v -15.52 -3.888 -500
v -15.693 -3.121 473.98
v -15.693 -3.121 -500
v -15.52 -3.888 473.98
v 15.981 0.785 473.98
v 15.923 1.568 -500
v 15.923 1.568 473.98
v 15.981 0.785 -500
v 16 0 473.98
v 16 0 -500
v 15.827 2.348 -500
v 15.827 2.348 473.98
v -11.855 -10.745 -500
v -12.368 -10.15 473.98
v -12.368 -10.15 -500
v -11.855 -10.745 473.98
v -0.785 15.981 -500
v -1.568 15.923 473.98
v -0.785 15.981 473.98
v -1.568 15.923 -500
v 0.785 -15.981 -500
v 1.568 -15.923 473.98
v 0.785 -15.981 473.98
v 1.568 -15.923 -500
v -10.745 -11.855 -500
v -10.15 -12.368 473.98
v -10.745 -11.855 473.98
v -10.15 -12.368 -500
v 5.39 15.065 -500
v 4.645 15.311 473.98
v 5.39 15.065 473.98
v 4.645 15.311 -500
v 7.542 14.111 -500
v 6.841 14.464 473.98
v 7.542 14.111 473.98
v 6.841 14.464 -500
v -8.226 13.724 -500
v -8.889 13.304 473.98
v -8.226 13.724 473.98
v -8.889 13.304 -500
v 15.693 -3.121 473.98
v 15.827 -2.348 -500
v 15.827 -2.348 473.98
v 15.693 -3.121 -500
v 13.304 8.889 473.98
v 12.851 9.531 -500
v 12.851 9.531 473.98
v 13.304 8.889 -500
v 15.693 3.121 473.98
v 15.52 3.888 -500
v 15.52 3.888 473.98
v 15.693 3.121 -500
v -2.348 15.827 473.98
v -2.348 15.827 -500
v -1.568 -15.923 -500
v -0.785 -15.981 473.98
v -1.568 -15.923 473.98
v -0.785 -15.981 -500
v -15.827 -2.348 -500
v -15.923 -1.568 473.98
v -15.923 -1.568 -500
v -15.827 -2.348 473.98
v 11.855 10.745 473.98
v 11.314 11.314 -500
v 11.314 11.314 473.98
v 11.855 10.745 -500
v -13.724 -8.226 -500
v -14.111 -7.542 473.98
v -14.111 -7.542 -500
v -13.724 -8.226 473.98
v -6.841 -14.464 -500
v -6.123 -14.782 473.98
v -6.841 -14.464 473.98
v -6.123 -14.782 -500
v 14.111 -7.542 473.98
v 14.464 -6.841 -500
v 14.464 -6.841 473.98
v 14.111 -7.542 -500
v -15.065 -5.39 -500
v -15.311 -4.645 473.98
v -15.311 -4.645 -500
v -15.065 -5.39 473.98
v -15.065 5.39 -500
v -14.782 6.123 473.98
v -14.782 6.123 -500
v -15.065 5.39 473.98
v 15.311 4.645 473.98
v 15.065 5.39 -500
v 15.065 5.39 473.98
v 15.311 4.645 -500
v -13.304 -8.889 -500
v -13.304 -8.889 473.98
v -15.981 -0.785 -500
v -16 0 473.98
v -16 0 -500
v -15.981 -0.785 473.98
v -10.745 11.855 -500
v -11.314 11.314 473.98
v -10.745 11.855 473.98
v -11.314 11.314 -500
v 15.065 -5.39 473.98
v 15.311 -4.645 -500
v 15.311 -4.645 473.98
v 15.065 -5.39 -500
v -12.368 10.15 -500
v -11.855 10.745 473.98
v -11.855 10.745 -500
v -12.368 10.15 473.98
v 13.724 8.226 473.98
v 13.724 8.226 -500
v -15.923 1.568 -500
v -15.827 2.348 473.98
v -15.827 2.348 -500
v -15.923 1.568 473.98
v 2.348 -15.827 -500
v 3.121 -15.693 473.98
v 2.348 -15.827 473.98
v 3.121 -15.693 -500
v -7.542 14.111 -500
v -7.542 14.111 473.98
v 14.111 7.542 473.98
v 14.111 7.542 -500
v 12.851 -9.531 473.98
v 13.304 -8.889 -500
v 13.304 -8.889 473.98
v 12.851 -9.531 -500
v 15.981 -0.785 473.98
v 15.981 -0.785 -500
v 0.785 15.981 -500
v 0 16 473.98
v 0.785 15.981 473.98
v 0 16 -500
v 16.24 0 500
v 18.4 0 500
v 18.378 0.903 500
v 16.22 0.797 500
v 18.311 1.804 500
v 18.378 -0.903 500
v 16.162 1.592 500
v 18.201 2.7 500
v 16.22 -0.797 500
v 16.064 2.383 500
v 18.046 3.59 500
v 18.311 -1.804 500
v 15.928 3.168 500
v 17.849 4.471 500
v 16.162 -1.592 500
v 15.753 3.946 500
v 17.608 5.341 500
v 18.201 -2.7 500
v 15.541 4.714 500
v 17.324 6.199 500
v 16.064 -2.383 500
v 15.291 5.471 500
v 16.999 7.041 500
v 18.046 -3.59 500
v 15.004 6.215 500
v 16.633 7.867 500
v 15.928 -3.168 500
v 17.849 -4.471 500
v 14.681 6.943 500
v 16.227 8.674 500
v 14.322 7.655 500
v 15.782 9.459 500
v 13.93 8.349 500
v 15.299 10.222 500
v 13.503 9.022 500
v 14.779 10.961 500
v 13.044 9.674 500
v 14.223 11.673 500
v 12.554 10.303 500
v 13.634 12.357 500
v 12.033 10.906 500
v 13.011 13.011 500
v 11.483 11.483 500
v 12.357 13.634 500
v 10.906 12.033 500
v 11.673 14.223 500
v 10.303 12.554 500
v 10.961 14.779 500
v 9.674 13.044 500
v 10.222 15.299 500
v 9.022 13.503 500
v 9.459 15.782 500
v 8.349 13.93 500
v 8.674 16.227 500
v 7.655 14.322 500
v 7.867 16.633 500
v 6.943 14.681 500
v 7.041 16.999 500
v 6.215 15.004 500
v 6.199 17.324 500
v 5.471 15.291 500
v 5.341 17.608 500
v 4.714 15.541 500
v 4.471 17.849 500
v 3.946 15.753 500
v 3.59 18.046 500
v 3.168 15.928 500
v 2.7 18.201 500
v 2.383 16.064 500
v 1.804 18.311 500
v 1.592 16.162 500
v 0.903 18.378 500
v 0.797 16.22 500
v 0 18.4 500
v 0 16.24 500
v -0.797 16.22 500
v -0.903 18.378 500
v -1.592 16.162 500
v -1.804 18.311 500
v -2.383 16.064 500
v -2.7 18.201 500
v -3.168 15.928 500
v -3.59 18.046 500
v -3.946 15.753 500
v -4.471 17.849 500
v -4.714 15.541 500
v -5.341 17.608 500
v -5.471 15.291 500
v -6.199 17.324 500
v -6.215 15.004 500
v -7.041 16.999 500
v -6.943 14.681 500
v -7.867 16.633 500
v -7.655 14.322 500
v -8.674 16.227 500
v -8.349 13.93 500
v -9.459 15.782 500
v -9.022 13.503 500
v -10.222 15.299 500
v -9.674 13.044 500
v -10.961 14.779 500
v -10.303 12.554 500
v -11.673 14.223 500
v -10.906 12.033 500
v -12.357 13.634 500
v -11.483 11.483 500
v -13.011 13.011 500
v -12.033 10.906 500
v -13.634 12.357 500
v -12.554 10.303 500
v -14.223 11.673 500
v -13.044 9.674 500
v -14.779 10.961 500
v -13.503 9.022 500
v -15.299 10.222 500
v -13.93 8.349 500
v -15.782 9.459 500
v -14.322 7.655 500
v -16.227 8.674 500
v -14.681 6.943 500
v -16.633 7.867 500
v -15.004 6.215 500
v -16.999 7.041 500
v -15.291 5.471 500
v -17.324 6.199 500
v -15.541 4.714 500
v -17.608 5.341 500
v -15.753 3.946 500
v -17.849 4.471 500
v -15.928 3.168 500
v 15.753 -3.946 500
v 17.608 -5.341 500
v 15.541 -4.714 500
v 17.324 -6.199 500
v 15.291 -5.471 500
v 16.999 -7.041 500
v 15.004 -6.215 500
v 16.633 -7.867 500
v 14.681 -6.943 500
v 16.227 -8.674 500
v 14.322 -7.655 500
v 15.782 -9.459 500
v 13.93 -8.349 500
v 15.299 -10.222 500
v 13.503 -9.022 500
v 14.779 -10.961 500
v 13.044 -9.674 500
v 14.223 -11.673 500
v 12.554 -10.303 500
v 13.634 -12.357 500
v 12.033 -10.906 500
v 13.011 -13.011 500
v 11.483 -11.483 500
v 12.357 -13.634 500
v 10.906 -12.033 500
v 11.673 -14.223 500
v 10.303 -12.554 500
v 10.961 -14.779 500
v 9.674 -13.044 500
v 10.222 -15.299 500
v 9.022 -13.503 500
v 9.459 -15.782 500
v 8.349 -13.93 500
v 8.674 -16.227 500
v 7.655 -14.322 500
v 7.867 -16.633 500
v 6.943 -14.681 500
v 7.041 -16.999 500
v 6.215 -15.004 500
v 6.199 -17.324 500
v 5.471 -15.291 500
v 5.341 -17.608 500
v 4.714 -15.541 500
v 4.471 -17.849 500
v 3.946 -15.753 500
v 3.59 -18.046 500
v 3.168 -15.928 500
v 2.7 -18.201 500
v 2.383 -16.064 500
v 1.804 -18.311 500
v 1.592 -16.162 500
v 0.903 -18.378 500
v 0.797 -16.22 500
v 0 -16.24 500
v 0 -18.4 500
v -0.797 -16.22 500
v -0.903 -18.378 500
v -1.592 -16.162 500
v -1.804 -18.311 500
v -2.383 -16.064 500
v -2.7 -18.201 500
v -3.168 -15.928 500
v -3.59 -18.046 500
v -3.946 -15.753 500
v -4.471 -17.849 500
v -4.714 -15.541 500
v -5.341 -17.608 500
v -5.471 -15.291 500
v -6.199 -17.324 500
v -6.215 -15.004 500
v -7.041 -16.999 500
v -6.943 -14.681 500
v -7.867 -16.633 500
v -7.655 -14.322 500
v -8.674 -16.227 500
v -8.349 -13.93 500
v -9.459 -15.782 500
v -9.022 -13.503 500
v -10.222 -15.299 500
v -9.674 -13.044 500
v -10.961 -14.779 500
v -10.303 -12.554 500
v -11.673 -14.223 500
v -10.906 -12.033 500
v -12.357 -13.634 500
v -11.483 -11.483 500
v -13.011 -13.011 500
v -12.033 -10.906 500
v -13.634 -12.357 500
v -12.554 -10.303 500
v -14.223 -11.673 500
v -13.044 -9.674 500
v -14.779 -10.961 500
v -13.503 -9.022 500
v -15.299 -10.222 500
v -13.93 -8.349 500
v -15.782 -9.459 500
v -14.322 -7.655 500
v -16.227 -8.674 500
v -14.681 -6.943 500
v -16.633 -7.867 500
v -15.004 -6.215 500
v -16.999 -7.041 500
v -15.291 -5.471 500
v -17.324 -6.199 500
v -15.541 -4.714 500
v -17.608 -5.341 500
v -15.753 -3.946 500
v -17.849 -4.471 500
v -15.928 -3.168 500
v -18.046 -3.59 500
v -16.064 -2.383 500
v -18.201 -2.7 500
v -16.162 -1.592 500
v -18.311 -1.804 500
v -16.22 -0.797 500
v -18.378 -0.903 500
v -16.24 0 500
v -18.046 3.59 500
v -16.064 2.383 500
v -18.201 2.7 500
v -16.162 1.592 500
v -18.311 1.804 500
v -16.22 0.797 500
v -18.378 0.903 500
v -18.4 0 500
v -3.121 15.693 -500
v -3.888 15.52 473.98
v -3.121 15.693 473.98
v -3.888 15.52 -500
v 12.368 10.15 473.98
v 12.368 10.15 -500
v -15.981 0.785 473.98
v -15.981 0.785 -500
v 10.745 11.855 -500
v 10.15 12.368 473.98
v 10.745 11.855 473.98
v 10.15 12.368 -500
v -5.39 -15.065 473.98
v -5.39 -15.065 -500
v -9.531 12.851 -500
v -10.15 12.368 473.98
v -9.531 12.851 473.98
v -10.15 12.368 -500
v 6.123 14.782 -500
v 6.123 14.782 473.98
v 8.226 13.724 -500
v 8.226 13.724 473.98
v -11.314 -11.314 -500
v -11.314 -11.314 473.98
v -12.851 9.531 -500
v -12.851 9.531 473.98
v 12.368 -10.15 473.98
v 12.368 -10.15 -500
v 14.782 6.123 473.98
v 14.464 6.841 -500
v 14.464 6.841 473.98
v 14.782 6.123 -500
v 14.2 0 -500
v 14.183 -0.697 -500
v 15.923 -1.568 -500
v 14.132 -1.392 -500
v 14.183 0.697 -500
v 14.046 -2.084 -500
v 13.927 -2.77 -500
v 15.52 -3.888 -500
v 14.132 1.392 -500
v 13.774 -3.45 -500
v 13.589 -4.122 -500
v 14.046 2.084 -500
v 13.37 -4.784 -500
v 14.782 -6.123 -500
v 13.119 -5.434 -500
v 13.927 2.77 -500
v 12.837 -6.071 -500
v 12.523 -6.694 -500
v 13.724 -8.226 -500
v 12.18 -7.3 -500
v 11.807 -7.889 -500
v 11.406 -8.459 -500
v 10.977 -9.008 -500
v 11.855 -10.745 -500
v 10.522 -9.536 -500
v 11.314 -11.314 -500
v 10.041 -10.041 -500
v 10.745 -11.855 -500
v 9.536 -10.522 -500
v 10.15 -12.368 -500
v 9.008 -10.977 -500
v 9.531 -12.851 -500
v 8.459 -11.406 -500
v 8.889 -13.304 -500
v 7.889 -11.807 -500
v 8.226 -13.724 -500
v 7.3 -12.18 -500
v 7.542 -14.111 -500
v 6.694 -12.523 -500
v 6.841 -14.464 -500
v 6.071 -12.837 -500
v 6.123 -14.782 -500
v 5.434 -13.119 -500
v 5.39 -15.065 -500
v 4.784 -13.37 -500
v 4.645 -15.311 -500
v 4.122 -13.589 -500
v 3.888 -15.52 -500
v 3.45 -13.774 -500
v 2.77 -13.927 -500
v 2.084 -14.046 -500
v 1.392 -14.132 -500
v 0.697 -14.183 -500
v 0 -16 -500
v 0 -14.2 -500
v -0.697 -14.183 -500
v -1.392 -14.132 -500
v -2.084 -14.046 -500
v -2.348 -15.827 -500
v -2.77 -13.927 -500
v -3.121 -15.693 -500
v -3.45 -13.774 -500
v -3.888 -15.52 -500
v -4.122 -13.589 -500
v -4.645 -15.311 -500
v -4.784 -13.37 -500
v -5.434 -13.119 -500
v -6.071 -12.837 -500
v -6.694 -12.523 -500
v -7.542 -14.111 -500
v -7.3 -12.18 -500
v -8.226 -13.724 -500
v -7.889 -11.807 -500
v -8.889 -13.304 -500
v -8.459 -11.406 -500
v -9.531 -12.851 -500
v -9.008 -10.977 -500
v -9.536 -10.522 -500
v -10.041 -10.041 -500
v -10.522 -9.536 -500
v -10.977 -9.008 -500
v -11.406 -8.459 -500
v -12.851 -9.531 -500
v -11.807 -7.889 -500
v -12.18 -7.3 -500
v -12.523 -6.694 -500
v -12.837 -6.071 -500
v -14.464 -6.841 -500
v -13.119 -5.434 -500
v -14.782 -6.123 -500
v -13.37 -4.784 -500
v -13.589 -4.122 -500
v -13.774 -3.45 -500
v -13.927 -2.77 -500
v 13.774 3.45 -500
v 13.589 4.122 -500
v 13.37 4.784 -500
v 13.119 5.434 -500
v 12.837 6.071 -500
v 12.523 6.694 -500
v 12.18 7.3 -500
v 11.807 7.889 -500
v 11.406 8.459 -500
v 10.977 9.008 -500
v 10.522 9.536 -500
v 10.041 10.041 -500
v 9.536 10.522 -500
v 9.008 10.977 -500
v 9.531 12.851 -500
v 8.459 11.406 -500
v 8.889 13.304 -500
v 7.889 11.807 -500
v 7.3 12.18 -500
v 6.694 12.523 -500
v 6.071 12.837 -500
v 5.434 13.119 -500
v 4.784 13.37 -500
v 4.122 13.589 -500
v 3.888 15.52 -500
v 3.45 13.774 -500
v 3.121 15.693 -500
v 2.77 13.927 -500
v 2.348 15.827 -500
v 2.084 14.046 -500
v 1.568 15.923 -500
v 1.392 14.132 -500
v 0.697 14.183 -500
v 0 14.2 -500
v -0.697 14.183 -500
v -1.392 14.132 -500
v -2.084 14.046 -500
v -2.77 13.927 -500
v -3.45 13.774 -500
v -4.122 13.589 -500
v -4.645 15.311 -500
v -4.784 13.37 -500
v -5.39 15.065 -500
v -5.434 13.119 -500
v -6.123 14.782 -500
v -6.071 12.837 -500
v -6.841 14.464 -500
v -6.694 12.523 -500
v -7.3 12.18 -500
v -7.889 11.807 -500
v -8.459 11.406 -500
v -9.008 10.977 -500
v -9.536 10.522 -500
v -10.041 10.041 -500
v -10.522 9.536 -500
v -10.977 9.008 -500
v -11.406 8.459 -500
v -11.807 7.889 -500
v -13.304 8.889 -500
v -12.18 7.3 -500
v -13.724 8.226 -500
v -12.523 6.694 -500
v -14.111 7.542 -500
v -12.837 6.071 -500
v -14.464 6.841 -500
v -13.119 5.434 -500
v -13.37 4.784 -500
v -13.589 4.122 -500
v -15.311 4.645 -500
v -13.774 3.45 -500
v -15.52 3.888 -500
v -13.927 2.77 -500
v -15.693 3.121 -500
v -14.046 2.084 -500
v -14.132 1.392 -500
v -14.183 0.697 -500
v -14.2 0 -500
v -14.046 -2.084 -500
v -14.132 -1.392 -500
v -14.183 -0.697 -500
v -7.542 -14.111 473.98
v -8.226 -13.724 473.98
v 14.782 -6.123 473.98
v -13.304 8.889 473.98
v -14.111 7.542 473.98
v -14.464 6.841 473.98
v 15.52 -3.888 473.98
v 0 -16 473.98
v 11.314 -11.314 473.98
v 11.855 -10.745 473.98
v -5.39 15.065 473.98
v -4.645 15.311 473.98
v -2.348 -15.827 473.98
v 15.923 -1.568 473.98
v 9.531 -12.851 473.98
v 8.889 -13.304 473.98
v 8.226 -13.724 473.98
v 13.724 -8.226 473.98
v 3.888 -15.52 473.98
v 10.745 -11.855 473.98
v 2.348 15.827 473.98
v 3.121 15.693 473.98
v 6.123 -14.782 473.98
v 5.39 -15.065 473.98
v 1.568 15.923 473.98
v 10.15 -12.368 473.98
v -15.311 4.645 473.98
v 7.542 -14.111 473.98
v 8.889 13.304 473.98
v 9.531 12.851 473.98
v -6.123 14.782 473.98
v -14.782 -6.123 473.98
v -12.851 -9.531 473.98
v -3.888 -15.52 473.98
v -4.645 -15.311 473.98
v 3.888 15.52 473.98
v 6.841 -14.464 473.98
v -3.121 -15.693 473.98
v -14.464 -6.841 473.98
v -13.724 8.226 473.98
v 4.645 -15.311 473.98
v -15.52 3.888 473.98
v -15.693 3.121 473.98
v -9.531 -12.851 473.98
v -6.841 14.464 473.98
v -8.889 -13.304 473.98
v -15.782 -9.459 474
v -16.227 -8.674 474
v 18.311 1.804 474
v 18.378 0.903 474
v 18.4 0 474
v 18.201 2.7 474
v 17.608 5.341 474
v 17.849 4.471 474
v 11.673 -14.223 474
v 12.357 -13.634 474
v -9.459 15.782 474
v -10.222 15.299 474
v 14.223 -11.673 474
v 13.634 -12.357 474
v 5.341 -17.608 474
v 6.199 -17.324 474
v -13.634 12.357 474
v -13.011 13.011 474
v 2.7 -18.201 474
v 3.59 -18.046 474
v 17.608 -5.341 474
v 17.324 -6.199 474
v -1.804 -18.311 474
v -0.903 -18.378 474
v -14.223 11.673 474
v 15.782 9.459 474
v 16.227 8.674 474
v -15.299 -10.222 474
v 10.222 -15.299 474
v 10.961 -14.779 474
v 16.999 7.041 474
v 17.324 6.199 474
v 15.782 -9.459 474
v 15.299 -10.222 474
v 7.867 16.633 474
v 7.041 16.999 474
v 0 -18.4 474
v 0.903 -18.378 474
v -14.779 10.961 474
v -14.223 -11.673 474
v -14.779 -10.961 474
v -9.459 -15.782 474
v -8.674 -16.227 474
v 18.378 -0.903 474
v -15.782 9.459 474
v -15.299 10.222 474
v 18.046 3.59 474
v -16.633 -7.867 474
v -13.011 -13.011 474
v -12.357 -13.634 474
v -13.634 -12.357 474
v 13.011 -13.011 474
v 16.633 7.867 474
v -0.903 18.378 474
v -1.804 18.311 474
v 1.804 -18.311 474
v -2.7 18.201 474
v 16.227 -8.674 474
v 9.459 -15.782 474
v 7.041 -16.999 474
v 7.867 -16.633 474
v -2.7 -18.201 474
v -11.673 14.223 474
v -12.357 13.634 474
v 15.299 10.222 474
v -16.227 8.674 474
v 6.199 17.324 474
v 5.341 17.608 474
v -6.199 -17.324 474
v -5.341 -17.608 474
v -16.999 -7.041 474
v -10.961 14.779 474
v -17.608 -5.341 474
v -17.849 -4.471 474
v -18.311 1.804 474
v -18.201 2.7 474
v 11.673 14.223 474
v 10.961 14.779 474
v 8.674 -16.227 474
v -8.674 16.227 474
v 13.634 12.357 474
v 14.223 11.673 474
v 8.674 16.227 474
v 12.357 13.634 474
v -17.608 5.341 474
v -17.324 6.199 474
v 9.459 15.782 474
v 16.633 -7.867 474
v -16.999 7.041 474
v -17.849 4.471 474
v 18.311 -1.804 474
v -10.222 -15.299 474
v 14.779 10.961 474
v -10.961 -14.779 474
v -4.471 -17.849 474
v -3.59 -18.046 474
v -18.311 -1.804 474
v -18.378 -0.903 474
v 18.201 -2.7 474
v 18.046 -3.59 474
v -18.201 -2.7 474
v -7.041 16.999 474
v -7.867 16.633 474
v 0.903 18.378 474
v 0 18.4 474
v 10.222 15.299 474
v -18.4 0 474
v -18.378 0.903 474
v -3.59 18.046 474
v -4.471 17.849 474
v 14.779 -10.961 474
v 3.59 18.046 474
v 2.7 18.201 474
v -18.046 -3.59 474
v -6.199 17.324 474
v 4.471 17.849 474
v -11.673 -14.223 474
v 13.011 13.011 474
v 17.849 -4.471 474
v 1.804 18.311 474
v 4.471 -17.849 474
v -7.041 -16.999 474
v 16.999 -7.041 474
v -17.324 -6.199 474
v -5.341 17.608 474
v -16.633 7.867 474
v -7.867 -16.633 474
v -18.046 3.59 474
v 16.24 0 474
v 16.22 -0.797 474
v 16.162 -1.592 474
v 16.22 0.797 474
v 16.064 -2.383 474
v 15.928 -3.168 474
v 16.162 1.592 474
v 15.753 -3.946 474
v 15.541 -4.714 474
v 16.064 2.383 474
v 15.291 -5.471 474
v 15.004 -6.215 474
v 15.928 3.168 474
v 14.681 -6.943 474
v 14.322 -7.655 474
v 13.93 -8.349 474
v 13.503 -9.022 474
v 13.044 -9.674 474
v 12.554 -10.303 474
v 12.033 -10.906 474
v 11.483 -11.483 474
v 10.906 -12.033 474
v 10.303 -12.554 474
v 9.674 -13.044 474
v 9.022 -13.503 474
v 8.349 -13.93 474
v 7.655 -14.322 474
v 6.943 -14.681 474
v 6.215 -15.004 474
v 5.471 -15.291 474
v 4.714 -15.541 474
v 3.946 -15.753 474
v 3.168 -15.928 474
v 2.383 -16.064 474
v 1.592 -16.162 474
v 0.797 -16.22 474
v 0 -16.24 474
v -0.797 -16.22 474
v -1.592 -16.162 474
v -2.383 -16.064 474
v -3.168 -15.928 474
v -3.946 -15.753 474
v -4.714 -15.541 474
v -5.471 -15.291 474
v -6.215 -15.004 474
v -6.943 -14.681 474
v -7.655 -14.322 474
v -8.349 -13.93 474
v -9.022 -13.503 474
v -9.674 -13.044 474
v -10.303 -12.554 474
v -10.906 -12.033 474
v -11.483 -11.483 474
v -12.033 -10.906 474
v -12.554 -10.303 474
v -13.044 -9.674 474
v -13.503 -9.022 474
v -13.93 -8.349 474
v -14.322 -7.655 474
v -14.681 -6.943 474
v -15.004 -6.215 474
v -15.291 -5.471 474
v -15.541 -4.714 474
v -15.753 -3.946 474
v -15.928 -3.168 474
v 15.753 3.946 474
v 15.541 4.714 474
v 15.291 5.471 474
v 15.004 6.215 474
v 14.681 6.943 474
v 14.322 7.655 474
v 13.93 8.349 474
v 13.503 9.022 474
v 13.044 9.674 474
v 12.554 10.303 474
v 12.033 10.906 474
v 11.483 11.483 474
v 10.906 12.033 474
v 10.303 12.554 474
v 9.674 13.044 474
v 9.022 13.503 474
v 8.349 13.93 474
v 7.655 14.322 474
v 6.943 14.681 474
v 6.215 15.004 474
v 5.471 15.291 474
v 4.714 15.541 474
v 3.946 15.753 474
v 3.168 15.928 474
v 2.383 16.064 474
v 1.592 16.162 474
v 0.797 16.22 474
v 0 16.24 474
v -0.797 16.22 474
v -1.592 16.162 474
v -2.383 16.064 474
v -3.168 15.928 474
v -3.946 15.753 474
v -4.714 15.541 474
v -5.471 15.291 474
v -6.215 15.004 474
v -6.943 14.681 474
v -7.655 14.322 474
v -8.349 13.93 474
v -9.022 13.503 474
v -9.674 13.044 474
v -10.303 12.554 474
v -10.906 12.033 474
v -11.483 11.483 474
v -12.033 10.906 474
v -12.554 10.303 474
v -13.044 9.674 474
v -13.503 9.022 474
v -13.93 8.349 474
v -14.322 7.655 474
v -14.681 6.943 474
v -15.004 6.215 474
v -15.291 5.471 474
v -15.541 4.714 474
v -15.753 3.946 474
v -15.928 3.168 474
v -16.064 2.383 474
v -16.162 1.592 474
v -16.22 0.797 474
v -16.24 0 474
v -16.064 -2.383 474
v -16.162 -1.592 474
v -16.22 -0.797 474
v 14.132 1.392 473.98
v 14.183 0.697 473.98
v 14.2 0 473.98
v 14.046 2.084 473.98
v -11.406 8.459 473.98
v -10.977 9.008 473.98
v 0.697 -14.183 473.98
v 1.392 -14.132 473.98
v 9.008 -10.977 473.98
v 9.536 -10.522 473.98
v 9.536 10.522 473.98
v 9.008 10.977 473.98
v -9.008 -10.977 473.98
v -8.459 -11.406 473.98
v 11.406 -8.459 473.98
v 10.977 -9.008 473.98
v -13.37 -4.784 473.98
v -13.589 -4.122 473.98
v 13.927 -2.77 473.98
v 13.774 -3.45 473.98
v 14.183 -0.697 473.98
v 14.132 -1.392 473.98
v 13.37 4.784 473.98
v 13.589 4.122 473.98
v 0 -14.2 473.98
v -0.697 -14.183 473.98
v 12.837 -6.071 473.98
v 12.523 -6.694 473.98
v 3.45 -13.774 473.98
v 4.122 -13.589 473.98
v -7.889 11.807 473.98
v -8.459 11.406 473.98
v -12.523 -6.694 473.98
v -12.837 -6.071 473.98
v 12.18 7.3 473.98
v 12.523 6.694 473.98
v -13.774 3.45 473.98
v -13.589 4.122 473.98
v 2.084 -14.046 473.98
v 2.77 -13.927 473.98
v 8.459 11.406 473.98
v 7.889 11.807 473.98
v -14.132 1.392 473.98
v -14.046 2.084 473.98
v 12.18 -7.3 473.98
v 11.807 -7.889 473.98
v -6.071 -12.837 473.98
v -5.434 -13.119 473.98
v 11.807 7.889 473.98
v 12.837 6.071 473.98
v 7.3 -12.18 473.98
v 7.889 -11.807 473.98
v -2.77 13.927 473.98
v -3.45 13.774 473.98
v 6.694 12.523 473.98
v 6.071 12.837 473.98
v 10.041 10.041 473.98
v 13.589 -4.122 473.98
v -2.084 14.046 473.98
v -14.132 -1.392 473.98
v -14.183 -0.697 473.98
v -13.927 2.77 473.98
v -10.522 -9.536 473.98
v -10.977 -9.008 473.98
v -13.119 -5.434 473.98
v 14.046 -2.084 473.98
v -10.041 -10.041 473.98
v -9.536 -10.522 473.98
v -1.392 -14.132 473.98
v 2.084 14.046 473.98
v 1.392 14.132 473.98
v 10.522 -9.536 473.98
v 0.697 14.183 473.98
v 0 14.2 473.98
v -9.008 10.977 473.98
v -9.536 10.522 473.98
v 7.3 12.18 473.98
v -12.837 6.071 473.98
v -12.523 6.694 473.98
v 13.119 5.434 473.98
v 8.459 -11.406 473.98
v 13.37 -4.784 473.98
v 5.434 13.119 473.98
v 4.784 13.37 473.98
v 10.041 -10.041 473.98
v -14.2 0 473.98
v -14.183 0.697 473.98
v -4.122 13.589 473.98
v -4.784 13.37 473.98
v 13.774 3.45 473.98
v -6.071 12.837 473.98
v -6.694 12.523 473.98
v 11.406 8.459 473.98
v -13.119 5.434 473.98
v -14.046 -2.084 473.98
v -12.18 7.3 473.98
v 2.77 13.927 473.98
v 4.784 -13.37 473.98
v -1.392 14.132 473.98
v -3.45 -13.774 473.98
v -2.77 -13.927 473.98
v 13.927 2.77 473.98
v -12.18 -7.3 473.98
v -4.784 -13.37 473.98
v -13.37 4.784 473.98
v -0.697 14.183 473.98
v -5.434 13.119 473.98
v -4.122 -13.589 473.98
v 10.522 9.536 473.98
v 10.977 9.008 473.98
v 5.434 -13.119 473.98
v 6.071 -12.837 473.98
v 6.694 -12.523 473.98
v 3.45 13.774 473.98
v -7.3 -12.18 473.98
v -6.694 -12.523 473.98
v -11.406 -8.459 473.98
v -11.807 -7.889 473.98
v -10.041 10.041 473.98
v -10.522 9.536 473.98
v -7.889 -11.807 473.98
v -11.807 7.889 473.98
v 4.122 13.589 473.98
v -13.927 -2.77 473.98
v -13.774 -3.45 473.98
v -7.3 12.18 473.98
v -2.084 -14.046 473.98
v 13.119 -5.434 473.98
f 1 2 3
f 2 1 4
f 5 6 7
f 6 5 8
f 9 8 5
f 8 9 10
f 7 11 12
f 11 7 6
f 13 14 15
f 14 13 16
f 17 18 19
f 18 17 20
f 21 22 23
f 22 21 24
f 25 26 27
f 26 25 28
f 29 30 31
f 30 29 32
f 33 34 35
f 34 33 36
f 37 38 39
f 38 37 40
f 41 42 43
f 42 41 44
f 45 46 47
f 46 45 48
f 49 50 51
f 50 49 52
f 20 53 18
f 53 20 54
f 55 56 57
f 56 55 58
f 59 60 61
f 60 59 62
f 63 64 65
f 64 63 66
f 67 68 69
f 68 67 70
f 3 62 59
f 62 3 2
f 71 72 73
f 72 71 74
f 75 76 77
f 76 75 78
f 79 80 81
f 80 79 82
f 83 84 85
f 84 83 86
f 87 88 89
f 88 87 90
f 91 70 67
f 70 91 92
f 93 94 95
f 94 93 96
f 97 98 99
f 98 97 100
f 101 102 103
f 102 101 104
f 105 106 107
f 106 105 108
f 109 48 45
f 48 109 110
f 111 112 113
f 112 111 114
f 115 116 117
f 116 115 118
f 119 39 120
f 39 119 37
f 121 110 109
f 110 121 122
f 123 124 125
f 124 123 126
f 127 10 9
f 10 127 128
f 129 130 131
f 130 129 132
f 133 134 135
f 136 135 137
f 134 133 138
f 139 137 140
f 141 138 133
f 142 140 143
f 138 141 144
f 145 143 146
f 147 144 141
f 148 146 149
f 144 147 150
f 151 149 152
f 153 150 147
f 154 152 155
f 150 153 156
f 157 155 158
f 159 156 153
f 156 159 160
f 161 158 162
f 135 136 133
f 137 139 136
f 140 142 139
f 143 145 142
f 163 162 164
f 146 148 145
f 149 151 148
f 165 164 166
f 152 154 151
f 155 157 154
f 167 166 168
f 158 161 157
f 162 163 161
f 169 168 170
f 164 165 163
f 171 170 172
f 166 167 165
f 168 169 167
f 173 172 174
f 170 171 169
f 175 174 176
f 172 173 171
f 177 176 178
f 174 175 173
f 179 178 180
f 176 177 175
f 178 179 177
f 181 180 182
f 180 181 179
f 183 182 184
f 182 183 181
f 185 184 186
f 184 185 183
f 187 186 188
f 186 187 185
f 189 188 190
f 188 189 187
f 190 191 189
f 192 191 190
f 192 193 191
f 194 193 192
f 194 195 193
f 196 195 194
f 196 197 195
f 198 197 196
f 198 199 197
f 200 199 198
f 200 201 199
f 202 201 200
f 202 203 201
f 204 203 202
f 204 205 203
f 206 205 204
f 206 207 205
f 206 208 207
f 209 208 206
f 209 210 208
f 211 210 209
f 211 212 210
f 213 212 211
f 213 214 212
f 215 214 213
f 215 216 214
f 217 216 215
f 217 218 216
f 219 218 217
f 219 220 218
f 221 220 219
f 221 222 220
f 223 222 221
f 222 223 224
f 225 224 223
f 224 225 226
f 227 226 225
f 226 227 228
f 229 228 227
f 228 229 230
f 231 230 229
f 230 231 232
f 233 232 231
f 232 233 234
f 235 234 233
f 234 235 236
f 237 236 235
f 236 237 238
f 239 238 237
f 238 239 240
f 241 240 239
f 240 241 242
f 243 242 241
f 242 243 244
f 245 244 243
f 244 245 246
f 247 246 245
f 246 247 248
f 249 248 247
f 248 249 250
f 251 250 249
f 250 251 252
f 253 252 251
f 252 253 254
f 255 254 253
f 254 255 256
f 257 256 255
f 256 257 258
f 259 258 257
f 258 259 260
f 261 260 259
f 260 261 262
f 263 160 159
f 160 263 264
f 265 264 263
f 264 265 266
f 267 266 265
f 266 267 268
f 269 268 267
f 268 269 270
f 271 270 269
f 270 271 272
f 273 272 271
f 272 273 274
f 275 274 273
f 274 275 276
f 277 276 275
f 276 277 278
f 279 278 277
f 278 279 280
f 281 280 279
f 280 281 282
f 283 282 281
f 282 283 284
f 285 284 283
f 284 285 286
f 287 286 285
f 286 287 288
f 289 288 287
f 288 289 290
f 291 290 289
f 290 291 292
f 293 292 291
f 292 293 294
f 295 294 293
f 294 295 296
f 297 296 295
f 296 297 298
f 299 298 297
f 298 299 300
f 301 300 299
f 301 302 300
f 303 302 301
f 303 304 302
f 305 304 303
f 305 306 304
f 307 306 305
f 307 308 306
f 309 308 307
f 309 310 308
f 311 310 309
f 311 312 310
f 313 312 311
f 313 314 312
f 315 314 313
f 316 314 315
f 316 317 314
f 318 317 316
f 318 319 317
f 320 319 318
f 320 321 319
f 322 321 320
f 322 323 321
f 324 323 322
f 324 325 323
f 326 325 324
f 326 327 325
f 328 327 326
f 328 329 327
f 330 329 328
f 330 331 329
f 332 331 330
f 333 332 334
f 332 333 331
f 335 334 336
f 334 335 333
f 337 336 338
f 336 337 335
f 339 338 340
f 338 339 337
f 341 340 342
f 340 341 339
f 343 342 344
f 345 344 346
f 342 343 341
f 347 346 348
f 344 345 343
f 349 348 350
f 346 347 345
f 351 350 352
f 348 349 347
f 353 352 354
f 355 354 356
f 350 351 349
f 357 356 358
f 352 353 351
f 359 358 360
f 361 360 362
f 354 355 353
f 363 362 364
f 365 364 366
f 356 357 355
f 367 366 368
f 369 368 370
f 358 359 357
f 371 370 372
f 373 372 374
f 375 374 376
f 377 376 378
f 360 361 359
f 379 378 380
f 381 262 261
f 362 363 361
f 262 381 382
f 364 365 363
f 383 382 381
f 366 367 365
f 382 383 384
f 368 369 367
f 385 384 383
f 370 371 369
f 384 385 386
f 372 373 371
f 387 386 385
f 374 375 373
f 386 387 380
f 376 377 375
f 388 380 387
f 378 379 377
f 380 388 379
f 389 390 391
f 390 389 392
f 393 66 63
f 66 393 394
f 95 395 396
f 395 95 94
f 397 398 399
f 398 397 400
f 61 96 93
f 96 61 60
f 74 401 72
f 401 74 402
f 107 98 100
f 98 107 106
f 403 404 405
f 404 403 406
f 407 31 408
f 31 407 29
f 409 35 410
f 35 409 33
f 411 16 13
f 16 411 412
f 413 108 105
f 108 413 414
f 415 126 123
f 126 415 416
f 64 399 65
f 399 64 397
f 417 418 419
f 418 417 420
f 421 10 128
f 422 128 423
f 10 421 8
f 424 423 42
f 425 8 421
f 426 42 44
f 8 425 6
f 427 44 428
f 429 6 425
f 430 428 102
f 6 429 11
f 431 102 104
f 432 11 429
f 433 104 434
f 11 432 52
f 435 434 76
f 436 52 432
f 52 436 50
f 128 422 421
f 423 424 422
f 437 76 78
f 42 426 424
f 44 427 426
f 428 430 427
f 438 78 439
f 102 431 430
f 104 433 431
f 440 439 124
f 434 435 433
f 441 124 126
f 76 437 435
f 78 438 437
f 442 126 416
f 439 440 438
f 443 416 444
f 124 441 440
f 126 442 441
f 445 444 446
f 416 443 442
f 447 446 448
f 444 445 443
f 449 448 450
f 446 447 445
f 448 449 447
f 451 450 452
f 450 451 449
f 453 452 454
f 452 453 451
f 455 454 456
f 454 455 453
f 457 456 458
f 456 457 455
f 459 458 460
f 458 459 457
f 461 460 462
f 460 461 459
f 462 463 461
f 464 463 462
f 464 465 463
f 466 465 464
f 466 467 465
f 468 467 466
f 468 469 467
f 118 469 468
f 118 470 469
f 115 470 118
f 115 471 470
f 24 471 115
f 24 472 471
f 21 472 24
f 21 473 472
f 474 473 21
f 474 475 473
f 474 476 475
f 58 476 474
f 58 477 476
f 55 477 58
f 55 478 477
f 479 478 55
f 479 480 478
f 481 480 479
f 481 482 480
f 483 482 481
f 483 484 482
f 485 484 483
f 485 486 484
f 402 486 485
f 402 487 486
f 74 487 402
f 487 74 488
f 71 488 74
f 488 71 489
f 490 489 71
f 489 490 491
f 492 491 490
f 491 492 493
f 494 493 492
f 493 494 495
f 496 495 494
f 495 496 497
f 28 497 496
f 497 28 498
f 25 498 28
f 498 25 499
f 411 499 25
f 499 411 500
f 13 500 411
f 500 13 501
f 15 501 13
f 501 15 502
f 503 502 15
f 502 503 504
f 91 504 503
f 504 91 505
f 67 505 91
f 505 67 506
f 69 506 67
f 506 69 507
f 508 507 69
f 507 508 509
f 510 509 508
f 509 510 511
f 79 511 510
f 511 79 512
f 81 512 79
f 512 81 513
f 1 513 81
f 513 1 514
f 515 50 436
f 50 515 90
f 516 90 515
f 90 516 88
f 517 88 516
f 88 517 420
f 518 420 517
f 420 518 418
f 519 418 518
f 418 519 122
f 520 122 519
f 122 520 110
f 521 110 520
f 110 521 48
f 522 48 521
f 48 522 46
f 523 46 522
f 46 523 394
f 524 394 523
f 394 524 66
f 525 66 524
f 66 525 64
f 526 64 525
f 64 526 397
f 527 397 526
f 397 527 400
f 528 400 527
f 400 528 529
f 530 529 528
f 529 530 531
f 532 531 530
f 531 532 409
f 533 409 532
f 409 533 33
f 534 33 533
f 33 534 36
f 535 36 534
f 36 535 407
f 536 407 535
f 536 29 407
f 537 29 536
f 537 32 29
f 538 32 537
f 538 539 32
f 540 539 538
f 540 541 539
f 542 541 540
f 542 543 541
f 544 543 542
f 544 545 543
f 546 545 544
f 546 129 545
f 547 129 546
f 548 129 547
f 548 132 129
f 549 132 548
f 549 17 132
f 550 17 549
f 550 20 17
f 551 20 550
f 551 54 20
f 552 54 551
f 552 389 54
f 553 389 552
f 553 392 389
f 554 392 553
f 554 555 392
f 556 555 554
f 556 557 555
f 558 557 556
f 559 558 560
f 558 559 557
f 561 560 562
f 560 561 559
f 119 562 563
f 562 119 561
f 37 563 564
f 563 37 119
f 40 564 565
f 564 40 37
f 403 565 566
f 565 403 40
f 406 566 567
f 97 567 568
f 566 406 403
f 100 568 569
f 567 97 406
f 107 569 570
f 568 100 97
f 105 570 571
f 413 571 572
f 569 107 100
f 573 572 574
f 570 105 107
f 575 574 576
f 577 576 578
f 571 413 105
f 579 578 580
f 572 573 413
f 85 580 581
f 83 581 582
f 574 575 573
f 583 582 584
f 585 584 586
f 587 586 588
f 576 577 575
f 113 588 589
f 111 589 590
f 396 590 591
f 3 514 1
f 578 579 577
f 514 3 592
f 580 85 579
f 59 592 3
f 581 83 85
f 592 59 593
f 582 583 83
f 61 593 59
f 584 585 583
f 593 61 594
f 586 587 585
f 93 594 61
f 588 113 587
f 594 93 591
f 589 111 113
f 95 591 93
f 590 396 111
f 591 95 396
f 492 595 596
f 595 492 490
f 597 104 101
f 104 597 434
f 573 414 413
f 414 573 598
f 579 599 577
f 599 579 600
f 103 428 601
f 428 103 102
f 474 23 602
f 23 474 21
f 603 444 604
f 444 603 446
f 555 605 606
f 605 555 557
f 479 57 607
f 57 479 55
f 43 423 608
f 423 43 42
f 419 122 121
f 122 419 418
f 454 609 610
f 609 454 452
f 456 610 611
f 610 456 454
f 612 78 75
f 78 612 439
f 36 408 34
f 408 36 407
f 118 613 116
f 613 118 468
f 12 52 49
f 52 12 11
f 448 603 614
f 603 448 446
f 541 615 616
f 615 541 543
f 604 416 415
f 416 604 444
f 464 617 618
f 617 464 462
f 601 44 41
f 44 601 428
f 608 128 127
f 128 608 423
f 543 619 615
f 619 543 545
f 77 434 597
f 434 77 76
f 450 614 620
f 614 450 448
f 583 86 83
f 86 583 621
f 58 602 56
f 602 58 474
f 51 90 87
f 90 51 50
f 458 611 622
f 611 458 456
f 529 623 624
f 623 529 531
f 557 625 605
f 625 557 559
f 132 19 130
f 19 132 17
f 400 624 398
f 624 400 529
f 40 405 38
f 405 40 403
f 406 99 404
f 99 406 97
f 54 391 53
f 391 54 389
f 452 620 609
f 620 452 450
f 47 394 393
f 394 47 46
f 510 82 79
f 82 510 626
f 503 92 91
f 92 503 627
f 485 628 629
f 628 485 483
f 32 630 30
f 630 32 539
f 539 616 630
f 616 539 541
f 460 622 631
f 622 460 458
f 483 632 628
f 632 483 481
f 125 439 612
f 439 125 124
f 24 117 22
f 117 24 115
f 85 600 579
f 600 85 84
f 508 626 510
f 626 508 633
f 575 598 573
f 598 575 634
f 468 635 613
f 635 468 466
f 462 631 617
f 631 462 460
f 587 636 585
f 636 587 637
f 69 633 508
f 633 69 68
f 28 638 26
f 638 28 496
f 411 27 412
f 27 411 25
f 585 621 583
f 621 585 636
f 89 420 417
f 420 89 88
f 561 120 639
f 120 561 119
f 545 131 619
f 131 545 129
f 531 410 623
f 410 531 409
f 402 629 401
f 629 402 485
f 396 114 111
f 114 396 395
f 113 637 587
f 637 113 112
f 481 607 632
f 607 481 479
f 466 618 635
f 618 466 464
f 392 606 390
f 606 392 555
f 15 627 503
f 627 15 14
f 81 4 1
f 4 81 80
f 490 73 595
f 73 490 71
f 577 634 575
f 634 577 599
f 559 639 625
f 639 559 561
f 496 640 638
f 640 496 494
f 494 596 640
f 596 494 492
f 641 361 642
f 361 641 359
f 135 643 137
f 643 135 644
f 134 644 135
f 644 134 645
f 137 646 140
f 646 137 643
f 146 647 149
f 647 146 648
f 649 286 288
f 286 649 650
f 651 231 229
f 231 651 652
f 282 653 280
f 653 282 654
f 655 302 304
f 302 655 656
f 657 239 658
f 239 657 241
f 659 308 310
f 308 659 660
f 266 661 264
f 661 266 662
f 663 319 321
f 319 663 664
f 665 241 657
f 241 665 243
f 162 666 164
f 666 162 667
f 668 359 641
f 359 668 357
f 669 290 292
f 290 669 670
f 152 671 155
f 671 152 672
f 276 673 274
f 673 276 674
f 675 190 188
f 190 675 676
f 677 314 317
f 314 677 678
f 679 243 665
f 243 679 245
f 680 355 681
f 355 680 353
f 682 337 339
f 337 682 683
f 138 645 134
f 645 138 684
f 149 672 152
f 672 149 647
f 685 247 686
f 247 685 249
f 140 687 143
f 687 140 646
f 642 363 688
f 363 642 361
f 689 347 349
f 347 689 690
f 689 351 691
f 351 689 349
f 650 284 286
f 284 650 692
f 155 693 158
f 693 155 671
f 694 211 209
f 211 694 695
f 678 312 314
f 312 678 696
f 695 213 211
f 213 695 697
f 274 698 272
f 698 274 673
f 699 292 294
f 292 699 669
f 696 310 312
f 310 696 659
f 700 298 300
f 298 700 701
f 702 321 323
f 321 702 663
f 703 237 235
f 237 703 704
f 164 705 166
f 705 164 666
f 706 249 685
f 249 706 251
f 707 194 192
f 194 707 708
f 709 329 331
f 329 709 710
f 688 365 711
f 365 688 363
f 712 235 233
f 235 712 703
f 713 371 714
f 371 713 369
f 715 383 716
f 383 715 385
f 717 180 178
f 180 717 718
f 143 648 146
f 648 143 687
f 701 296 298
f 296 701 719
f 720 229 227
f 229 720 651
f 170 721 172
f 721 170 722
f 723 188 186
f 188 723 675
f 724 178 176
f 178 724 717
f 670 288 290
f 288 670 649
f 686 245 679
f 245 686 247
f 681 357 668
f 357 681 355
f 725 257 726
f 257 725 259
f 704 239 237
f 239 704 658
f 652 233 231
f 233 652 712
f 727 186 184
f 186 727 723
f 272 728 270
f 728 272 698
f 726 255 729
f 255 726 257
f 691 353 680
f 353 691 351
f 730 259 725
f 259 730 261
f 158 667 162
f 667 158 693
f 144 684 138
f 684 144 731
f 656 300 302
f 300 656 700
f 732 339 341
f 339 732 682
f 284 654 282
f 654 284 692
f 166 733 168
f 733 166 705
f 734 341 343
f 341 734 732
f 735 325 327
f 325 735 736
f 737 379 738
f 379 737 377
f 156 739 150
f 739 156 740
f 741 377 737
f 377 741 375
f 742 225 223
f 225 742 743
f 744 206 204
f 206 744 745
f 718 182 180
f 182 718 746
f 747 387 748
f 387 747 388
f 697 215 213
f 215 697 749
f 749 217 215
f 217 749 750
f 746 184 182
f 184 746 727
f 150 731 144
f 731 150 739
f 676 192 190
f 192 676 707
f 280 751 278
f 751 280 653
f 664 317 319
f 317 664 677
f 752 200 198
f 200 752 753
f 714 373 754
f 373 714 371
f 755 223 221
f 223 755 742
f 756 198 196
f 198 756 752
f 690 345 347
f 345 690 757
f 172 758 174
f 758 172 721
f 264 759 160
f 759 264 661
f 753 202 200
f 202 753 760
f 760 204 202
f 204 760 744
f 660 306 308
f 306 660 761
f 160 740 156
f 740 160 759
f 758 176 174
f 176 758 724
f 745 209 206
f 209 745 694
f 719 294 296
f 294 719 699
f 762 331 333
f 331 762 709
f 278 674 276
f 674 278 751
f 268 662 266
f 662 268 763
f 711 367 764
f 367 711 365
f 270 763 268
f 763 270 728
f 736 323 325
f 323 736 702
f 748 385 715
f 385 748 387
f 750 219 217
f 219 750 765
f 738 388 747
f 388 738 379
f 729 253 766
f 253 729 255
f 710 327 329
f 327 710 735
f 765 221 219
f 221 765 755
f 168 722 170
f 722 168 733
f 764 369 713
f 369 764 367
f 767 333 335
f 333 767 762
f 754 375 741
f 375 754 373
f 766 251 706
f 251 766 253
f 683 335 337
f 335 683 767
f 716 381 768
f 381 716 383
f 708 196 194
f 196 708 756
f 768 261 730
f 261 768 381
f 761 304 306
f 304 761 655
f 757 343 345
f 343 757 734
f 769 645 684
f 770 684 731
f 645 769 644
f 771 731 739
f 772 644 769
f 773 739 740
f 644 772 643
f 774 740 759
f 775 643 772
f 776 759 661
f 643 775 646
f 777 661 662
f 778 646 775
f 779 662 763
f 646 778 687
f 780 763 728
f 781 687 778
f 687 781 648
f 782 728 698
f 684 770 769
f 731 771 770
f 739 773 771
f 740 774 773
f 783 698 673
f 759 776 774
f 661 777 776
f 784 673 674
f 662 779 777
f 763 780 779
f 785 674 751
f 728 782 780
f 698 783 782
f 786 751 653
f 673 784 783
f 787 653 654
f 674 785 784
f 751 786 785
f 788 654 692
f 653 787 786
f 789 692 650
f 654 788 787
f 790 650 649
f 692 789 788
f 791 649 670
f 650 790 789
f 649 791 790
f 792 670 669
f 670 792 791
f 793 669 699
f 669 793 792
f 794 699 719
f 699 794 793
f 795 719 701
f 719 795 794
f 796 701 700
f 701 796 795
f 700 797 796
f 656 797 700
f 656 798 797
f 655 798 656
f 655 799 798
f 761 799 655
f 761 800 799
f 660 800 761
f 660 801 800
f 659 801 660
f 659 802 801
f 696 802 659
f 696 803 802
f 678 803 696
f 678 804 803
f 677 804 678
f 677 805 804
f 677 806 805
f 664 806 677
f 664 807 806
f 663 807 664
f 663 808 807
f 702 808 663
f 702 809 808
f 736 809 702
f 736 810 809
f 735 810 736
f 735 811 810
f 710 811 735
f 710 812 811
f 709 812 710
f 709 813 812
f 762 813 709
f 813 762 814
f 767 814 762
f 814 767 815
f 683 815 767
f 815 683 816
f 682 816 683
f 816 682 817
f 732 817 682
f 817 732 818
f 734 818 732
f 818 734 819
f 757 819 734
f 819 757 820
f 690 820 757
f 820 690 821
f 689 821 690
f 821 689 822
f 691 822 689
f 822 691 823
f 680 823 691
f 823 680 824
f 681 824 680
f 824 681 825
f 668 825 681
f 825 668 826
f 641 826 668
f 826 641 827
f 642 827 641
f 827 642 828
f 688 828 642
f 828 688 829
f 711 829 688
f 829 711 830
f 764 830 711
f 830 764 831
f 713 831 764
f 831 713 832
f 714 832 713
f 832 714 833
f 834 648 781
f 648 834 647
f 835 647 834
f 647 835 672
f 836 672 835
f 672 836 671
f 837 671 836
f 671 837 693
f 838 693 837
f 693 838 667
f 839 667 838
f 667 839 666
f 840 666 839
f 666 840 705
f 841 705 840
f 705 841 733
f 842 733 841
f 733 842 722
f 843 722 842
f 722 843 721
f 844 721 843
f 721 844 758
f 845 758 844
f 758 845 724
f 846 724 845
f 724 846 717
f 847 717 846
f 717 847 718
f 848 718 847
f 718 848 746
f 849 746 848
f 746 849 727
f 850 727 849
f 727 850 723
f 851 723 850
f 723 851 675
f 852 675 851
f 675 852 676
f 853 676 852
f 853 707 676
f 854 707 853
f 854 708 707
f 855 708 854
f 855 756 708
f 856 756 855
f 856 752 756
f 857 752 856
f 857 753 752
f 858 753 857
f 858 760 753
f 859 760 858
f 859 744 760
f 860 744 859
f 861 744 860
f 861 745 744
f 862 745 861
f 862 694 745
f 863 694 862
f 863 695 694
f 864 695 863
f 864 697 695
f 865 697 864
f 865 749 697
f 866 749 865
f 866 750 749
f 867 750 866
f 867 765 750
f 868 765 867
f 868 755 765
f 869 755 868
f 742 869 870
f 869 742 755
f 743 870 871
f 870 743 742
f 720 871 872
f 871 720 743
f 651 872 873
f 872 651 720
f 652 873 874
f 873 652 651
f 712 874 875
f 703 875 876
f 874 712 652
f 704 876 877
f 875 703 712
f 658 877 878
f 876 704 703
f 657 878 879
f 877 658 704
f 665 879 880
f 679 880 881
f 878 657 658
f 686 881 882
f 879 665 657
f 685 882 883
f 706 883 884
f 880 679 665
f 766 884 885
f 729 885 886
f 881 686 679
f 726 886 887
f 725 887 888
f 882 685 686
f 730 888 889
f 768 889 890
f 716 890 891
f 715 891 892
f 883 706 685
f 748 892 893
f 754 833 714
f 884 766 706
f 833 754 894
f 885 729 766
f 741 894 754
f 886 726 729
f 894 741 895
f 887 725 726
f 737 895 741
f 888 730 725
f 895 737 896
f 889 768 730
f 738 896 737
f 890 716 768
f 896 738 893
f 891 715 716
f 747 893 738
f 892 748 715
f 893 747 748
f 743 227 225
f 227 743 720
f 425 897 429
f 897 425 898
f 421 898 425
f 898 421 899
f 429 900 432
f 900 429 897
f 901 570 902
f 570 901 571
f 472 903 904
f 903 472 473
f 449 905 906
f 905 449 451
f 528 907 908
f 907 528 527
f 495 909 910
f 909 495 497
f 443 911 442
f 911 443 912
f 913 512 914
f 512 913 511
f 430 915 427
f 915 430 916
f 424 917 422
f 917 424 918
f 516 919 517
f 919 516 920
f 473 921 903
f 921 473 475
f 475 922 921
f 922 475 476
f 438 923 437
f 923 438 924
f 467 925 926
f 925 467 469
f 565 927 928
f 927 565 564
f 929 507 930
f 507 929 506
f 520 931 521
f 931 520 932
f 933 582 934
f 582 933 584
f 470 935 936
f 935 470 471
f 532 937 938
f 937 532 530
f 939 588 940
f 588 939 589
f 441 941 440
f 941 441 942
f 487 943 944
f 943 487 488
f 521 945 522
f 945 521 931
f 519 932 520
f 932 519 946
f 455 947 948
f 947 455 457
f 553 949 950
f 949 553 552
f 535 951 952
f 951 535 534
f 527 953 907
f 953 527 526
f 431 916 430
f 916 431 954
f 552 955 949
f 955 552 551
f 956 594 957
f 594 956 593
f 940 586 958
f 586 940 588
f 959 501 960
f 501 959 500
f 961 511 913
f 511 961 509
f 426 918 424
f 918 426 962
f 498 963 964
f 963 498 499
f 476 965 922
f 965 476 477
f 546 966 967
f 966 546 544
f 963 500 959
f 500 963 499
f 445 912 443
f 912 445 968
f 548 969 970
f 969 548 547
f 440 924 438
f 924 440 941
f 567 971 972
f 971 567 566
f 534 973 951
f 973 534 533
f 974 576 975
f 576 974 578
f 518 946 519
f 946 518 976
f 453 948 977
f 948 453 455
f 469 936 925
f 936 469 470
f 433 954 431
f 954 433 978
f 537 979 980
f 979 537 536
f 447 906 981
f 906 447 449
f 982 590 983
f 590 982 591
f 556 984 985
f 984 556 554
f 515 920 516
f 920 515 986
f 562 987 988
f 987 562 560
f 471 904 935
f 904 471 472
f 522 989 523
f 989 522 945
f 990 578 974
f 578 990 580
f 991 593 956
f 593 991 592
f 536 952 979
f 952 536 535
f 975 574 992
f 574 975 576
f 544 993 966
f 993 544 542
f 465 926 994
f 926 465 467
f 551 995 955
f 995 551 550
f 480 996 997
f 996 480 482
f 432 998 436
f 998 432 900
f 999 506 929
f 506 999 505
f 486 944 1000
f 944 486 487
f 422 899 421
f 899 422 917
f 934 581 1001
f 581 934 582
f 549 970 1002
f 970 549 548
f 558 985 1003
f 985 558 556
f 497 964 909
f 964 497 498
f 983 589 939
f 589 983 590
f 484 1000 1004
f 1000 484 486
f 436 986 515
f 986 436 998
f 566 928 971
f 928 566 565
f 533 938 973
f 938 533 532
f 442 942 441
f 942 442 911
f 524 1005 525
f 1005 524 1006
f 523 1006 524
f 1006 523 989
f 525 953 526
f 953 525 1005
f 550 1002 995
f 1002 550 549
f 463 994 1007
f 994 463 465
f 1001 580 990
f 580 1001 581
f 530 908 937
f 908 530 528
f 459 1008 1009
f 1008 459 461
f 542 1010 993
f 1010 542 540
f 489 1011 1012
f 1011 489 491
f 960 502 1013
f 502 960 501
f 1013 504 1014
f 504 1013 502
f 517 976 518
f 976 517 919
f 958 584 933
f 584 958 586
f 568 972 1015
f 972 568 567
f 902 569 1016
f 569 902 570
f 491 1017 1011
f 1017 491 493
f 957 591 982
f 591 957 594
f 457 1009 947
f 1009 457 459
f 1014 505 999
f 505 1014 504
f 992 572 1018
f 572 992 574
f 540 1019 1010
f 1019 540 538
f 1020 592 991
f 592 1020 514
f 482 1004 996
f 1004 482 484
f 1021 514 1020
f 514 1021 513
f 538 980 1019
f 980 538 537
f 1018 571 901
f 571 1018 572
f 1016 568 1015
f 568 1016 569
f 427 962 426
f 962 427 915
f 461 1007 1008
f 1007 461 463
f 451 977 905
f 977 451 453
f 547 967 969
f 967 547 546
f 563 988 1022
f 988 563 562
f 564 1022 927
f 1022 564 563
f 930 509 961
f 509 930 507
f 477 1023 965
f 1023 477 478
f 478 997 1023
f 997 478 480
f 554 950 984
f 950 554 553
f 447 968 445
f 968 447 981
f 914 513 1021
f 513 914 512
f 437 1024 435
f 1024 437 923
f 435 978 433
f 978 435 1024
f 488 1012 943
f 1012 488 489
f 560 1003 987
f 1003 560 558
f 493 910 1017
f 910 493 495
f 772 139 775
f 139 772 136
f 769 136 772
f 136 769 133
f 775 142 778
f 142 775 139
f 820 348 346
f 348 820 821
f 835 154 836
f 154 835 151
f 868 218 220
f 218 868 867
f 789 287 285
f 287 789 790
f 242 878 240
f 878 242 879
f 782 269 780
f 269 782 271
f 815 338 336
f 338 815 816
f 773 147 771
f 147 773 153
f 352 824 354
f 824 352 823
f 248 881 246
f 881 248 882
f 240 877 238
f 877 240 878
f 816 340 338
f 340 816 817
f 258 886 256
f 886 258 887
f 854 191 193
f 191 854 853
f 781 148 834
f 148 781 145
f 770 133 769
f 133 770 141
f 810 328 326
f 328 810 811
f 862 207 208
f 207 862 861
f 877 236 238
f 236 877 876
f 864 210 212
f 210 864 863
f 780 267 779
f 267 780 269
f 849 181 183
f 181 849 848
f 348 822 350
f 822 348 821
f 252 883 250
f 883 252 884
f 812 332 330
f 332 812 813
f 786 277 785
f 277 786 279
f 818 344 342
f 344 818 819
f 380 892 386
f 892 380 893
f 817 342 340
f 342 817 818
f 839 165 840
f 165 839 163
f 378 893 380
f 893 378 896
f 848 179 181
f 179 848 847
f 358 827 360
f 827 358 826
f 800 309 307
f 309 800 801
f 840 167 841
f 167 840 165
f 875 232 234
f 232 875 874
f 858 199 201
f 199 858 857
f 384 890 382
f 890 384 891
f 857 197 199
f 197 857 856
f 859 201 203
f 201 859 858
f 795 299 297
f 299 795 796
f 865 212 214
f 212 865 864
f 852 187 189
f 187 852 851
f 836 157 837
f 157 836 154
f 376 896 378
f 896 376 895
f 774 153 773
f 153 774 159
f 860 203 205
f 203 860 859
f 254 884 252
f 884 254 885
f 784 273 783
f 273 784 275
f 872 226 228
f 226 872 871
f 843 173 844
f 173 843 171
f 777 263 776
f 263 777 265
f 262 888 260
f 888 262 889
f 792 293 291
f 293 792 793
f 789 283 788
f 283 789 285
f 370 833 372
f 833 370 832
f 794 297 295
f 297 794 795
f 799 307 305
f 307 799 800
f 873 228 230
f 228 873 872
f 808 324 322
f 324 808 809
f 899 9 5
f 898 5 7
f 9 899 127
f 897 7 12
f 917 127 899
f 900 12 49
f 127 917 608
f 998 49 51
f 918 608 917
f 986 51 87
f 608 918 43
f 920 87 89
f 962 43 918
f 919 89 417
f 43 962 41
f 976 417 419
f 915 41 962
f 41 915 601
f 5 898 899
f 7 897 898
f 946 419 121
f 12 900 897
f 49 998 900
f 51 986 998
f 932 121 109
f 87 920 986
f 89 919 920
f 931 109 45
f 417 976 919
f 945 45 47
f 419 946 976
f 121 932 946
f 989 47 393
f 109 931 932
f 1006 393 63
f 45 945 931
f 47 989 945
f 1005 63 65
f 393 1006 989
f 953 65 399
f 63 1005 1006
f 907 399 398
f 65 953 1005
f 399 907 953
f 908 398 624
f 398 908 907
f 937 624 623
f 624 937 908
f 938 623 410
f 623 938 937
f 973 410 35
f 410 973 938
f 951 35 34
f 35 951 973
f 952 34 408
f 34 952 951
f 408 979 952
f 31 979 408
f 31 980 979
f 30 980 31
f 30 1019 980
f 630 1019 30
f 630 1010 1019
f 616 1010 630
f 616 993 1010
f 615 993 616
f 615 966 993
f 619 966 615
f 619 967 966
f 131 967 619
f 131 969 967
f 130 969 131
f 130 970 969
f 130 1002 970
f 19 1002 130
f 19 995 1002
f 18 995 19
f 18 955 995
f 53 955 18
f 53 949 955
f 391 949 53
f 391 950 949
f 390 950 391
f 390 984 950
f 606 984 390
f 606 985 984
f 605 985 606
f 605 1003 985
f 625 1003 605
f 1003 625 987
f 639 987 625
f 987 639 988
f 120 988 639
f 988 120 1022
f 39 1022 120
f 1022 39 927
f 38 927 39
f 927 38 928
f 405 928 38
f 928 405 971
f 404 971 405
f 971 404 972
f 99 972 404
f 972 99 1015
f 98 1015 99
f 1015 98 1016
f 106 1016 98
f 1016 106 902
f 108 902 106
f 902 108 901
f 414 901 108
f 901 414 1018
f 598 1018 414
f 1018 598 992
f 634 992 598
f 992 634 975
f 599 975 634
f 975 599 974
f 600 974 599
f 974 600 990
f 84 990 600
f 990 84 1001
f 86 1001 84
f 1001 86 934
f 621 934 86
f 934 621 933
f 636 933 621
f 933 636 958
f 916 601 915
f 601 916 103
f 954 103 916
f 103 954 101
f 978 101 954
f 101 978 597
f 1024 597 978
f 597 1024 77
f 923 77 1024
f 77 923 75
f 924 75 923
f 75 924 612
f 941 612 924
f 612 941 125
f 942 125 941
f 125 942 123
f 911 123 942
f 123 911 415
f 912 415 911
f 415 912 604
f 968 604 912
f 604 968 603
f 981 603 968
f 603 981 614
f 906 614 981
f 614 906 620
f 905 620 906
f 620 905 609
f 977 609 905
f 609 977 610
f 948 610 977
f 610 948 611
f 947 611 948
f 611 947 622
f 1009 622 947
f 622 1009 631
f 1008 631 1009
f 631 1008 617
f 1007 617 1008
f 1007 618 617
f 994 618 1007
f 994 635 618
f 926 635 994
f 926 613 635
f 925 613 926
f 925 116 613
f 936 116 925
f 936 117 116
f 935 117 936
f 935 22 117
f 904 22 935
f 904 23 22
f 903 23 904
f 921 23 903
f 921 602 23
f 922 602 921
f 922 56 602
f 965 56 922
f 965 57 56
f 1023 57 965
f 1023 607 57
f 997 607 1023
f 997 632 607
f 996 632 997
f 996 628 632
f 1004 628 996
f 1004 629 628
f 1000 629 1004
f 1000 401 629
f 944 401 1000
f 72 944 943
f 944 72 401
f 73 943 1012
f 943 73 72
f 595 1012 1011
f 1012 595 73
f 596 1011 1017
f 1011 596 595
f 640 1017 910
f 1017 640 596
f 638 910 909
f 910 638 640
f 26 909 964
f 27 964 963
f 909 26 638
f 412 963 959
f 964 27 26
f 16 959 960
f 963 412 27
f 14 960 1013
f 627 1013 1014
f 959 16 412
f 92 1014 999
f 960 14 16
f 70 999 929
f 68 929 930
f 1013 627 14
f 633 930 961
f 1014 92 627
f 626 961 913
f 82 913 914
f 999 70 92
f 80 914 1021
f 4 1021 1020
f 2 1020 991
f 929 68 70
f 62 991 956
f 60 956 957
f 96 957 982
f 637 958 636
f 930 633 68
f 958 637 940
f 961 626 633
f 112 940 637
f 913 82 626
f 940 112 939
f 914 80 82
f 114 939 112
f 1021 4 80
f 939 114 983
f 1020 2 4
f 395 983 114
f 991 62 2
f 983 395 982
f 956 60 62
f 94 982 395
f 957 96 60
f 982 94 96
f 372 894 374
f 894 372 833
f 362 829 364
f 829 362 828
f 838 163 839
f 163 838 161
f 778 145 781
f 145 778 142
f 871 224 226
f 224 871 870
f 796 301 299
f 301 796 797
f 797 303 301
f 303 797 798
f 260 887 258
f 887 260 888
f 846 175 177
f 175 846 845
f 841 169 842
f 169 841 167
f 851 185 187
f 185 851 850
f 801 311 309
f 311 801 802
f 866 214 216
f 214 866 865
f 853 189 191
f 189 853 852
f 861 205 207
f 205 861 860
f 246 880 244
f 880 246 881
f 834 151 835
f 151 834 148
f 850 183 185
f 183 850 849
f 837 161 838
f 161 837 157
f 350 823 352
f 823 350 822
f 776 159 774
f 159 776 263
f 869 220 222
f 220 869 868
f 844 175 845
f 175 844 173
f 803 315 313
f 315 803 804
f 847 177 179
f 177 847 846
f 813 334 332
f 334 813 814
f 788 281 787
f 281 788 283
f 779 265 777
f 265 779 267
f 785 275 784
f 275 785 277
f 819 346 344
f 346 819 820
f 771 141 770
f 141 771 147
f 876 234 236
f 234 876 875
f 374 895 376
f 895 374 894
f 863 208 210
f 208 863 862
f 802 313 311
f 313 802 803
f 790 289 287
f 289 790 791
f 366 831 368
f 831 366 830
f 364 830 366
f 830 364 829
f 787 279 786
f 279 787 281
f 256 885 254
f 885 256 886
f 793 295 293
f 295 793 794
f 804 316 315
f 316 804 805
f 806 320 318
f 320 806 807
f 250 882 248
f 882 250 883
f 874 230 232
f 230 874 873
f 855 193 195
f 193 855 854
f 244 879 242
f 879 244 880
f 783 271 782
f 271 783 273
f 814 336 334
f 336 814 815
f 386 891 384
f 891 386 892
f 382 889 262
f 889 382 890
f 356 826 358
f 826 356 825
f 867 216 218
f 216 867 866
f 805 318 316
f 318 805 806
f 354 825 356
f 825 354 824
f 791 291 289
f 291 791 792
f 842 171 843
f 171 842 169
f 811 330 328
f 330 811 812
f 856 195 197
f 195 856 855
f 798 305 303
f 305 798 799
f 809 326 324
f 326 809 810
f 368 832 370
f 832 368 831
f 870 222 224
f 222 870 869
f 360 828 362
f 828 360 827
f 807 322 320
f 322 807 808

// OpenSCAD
// HT 32 pipe 1000 mm (simple parametric model)
// One connected solid, centered for reliable orthographic views.

$fn = 128;

// Parameters
nominal_size = 32;          // informational
length_mm = 1000;           // pipe length
pipe_od = 32;               // outer diameter
pipe_wall = 1.8;            // wall thickness

socket_len = 25;            // socket (muff) length
socket_od_scale = 1.15;     // socket OD relative to pipe OD
socket_wall_scale = 1.2;    // socket wall relative to pipe wall

overlap = 1;                // overlap to guarantee connectivity
eps = 0.02;                 // small epsilon for robust booleans

module ht_pipe_32_1000() {
    pipe_r = pipe_od/2;
    pipe_ir = max(0.1, pipe_r - pipe_wall);

    socket_od = pipe_od * socket_od_scale;
    socket_r  = socket_od/2;
    socket_wall = pipe_wall * socket_wall_scale;
    socket_ir = max(0.1, socket_r - socket_wall);

    // Center the whole part on Z for better visibility in all ortho views
    translate([0, 0, -length_mm/2])
    color([0.85, 0.85, 0.80])
    difference() {
        // OUTER: pipe + socket (unioned and overlapped)
        union() {
            // Main pipe outer
            cylinder(h=length_mm, r=pipe_r, center=false);

            // Socket outer at one end, overlapped into pipe by 'overlap'
            translate([0, 0, length_mm - socket_len - overlap])
                cylinder(h=socket_len + overlap, r=socket_r, center=false);
        }

        // INNER VOID: through-bore + socket inner (unioned)
        union() {
            // Through-bore (slightly extended to avoid coplanar faces)
            translate([0, 0, -eps])
                cylinder(h=length_mm + 2*eps, r=pipe_ir, center=false);

            // Socket inner cavity (larger ID than pipe ID), slightly extended
            translate([0, 0, length_mm - socket_len - overlap - eps])
                cylinder(h=socket_len + overlap + 2*eps, r=socket_ir, center=false);
        }
    }
}

ht_pipe_32_1000();
